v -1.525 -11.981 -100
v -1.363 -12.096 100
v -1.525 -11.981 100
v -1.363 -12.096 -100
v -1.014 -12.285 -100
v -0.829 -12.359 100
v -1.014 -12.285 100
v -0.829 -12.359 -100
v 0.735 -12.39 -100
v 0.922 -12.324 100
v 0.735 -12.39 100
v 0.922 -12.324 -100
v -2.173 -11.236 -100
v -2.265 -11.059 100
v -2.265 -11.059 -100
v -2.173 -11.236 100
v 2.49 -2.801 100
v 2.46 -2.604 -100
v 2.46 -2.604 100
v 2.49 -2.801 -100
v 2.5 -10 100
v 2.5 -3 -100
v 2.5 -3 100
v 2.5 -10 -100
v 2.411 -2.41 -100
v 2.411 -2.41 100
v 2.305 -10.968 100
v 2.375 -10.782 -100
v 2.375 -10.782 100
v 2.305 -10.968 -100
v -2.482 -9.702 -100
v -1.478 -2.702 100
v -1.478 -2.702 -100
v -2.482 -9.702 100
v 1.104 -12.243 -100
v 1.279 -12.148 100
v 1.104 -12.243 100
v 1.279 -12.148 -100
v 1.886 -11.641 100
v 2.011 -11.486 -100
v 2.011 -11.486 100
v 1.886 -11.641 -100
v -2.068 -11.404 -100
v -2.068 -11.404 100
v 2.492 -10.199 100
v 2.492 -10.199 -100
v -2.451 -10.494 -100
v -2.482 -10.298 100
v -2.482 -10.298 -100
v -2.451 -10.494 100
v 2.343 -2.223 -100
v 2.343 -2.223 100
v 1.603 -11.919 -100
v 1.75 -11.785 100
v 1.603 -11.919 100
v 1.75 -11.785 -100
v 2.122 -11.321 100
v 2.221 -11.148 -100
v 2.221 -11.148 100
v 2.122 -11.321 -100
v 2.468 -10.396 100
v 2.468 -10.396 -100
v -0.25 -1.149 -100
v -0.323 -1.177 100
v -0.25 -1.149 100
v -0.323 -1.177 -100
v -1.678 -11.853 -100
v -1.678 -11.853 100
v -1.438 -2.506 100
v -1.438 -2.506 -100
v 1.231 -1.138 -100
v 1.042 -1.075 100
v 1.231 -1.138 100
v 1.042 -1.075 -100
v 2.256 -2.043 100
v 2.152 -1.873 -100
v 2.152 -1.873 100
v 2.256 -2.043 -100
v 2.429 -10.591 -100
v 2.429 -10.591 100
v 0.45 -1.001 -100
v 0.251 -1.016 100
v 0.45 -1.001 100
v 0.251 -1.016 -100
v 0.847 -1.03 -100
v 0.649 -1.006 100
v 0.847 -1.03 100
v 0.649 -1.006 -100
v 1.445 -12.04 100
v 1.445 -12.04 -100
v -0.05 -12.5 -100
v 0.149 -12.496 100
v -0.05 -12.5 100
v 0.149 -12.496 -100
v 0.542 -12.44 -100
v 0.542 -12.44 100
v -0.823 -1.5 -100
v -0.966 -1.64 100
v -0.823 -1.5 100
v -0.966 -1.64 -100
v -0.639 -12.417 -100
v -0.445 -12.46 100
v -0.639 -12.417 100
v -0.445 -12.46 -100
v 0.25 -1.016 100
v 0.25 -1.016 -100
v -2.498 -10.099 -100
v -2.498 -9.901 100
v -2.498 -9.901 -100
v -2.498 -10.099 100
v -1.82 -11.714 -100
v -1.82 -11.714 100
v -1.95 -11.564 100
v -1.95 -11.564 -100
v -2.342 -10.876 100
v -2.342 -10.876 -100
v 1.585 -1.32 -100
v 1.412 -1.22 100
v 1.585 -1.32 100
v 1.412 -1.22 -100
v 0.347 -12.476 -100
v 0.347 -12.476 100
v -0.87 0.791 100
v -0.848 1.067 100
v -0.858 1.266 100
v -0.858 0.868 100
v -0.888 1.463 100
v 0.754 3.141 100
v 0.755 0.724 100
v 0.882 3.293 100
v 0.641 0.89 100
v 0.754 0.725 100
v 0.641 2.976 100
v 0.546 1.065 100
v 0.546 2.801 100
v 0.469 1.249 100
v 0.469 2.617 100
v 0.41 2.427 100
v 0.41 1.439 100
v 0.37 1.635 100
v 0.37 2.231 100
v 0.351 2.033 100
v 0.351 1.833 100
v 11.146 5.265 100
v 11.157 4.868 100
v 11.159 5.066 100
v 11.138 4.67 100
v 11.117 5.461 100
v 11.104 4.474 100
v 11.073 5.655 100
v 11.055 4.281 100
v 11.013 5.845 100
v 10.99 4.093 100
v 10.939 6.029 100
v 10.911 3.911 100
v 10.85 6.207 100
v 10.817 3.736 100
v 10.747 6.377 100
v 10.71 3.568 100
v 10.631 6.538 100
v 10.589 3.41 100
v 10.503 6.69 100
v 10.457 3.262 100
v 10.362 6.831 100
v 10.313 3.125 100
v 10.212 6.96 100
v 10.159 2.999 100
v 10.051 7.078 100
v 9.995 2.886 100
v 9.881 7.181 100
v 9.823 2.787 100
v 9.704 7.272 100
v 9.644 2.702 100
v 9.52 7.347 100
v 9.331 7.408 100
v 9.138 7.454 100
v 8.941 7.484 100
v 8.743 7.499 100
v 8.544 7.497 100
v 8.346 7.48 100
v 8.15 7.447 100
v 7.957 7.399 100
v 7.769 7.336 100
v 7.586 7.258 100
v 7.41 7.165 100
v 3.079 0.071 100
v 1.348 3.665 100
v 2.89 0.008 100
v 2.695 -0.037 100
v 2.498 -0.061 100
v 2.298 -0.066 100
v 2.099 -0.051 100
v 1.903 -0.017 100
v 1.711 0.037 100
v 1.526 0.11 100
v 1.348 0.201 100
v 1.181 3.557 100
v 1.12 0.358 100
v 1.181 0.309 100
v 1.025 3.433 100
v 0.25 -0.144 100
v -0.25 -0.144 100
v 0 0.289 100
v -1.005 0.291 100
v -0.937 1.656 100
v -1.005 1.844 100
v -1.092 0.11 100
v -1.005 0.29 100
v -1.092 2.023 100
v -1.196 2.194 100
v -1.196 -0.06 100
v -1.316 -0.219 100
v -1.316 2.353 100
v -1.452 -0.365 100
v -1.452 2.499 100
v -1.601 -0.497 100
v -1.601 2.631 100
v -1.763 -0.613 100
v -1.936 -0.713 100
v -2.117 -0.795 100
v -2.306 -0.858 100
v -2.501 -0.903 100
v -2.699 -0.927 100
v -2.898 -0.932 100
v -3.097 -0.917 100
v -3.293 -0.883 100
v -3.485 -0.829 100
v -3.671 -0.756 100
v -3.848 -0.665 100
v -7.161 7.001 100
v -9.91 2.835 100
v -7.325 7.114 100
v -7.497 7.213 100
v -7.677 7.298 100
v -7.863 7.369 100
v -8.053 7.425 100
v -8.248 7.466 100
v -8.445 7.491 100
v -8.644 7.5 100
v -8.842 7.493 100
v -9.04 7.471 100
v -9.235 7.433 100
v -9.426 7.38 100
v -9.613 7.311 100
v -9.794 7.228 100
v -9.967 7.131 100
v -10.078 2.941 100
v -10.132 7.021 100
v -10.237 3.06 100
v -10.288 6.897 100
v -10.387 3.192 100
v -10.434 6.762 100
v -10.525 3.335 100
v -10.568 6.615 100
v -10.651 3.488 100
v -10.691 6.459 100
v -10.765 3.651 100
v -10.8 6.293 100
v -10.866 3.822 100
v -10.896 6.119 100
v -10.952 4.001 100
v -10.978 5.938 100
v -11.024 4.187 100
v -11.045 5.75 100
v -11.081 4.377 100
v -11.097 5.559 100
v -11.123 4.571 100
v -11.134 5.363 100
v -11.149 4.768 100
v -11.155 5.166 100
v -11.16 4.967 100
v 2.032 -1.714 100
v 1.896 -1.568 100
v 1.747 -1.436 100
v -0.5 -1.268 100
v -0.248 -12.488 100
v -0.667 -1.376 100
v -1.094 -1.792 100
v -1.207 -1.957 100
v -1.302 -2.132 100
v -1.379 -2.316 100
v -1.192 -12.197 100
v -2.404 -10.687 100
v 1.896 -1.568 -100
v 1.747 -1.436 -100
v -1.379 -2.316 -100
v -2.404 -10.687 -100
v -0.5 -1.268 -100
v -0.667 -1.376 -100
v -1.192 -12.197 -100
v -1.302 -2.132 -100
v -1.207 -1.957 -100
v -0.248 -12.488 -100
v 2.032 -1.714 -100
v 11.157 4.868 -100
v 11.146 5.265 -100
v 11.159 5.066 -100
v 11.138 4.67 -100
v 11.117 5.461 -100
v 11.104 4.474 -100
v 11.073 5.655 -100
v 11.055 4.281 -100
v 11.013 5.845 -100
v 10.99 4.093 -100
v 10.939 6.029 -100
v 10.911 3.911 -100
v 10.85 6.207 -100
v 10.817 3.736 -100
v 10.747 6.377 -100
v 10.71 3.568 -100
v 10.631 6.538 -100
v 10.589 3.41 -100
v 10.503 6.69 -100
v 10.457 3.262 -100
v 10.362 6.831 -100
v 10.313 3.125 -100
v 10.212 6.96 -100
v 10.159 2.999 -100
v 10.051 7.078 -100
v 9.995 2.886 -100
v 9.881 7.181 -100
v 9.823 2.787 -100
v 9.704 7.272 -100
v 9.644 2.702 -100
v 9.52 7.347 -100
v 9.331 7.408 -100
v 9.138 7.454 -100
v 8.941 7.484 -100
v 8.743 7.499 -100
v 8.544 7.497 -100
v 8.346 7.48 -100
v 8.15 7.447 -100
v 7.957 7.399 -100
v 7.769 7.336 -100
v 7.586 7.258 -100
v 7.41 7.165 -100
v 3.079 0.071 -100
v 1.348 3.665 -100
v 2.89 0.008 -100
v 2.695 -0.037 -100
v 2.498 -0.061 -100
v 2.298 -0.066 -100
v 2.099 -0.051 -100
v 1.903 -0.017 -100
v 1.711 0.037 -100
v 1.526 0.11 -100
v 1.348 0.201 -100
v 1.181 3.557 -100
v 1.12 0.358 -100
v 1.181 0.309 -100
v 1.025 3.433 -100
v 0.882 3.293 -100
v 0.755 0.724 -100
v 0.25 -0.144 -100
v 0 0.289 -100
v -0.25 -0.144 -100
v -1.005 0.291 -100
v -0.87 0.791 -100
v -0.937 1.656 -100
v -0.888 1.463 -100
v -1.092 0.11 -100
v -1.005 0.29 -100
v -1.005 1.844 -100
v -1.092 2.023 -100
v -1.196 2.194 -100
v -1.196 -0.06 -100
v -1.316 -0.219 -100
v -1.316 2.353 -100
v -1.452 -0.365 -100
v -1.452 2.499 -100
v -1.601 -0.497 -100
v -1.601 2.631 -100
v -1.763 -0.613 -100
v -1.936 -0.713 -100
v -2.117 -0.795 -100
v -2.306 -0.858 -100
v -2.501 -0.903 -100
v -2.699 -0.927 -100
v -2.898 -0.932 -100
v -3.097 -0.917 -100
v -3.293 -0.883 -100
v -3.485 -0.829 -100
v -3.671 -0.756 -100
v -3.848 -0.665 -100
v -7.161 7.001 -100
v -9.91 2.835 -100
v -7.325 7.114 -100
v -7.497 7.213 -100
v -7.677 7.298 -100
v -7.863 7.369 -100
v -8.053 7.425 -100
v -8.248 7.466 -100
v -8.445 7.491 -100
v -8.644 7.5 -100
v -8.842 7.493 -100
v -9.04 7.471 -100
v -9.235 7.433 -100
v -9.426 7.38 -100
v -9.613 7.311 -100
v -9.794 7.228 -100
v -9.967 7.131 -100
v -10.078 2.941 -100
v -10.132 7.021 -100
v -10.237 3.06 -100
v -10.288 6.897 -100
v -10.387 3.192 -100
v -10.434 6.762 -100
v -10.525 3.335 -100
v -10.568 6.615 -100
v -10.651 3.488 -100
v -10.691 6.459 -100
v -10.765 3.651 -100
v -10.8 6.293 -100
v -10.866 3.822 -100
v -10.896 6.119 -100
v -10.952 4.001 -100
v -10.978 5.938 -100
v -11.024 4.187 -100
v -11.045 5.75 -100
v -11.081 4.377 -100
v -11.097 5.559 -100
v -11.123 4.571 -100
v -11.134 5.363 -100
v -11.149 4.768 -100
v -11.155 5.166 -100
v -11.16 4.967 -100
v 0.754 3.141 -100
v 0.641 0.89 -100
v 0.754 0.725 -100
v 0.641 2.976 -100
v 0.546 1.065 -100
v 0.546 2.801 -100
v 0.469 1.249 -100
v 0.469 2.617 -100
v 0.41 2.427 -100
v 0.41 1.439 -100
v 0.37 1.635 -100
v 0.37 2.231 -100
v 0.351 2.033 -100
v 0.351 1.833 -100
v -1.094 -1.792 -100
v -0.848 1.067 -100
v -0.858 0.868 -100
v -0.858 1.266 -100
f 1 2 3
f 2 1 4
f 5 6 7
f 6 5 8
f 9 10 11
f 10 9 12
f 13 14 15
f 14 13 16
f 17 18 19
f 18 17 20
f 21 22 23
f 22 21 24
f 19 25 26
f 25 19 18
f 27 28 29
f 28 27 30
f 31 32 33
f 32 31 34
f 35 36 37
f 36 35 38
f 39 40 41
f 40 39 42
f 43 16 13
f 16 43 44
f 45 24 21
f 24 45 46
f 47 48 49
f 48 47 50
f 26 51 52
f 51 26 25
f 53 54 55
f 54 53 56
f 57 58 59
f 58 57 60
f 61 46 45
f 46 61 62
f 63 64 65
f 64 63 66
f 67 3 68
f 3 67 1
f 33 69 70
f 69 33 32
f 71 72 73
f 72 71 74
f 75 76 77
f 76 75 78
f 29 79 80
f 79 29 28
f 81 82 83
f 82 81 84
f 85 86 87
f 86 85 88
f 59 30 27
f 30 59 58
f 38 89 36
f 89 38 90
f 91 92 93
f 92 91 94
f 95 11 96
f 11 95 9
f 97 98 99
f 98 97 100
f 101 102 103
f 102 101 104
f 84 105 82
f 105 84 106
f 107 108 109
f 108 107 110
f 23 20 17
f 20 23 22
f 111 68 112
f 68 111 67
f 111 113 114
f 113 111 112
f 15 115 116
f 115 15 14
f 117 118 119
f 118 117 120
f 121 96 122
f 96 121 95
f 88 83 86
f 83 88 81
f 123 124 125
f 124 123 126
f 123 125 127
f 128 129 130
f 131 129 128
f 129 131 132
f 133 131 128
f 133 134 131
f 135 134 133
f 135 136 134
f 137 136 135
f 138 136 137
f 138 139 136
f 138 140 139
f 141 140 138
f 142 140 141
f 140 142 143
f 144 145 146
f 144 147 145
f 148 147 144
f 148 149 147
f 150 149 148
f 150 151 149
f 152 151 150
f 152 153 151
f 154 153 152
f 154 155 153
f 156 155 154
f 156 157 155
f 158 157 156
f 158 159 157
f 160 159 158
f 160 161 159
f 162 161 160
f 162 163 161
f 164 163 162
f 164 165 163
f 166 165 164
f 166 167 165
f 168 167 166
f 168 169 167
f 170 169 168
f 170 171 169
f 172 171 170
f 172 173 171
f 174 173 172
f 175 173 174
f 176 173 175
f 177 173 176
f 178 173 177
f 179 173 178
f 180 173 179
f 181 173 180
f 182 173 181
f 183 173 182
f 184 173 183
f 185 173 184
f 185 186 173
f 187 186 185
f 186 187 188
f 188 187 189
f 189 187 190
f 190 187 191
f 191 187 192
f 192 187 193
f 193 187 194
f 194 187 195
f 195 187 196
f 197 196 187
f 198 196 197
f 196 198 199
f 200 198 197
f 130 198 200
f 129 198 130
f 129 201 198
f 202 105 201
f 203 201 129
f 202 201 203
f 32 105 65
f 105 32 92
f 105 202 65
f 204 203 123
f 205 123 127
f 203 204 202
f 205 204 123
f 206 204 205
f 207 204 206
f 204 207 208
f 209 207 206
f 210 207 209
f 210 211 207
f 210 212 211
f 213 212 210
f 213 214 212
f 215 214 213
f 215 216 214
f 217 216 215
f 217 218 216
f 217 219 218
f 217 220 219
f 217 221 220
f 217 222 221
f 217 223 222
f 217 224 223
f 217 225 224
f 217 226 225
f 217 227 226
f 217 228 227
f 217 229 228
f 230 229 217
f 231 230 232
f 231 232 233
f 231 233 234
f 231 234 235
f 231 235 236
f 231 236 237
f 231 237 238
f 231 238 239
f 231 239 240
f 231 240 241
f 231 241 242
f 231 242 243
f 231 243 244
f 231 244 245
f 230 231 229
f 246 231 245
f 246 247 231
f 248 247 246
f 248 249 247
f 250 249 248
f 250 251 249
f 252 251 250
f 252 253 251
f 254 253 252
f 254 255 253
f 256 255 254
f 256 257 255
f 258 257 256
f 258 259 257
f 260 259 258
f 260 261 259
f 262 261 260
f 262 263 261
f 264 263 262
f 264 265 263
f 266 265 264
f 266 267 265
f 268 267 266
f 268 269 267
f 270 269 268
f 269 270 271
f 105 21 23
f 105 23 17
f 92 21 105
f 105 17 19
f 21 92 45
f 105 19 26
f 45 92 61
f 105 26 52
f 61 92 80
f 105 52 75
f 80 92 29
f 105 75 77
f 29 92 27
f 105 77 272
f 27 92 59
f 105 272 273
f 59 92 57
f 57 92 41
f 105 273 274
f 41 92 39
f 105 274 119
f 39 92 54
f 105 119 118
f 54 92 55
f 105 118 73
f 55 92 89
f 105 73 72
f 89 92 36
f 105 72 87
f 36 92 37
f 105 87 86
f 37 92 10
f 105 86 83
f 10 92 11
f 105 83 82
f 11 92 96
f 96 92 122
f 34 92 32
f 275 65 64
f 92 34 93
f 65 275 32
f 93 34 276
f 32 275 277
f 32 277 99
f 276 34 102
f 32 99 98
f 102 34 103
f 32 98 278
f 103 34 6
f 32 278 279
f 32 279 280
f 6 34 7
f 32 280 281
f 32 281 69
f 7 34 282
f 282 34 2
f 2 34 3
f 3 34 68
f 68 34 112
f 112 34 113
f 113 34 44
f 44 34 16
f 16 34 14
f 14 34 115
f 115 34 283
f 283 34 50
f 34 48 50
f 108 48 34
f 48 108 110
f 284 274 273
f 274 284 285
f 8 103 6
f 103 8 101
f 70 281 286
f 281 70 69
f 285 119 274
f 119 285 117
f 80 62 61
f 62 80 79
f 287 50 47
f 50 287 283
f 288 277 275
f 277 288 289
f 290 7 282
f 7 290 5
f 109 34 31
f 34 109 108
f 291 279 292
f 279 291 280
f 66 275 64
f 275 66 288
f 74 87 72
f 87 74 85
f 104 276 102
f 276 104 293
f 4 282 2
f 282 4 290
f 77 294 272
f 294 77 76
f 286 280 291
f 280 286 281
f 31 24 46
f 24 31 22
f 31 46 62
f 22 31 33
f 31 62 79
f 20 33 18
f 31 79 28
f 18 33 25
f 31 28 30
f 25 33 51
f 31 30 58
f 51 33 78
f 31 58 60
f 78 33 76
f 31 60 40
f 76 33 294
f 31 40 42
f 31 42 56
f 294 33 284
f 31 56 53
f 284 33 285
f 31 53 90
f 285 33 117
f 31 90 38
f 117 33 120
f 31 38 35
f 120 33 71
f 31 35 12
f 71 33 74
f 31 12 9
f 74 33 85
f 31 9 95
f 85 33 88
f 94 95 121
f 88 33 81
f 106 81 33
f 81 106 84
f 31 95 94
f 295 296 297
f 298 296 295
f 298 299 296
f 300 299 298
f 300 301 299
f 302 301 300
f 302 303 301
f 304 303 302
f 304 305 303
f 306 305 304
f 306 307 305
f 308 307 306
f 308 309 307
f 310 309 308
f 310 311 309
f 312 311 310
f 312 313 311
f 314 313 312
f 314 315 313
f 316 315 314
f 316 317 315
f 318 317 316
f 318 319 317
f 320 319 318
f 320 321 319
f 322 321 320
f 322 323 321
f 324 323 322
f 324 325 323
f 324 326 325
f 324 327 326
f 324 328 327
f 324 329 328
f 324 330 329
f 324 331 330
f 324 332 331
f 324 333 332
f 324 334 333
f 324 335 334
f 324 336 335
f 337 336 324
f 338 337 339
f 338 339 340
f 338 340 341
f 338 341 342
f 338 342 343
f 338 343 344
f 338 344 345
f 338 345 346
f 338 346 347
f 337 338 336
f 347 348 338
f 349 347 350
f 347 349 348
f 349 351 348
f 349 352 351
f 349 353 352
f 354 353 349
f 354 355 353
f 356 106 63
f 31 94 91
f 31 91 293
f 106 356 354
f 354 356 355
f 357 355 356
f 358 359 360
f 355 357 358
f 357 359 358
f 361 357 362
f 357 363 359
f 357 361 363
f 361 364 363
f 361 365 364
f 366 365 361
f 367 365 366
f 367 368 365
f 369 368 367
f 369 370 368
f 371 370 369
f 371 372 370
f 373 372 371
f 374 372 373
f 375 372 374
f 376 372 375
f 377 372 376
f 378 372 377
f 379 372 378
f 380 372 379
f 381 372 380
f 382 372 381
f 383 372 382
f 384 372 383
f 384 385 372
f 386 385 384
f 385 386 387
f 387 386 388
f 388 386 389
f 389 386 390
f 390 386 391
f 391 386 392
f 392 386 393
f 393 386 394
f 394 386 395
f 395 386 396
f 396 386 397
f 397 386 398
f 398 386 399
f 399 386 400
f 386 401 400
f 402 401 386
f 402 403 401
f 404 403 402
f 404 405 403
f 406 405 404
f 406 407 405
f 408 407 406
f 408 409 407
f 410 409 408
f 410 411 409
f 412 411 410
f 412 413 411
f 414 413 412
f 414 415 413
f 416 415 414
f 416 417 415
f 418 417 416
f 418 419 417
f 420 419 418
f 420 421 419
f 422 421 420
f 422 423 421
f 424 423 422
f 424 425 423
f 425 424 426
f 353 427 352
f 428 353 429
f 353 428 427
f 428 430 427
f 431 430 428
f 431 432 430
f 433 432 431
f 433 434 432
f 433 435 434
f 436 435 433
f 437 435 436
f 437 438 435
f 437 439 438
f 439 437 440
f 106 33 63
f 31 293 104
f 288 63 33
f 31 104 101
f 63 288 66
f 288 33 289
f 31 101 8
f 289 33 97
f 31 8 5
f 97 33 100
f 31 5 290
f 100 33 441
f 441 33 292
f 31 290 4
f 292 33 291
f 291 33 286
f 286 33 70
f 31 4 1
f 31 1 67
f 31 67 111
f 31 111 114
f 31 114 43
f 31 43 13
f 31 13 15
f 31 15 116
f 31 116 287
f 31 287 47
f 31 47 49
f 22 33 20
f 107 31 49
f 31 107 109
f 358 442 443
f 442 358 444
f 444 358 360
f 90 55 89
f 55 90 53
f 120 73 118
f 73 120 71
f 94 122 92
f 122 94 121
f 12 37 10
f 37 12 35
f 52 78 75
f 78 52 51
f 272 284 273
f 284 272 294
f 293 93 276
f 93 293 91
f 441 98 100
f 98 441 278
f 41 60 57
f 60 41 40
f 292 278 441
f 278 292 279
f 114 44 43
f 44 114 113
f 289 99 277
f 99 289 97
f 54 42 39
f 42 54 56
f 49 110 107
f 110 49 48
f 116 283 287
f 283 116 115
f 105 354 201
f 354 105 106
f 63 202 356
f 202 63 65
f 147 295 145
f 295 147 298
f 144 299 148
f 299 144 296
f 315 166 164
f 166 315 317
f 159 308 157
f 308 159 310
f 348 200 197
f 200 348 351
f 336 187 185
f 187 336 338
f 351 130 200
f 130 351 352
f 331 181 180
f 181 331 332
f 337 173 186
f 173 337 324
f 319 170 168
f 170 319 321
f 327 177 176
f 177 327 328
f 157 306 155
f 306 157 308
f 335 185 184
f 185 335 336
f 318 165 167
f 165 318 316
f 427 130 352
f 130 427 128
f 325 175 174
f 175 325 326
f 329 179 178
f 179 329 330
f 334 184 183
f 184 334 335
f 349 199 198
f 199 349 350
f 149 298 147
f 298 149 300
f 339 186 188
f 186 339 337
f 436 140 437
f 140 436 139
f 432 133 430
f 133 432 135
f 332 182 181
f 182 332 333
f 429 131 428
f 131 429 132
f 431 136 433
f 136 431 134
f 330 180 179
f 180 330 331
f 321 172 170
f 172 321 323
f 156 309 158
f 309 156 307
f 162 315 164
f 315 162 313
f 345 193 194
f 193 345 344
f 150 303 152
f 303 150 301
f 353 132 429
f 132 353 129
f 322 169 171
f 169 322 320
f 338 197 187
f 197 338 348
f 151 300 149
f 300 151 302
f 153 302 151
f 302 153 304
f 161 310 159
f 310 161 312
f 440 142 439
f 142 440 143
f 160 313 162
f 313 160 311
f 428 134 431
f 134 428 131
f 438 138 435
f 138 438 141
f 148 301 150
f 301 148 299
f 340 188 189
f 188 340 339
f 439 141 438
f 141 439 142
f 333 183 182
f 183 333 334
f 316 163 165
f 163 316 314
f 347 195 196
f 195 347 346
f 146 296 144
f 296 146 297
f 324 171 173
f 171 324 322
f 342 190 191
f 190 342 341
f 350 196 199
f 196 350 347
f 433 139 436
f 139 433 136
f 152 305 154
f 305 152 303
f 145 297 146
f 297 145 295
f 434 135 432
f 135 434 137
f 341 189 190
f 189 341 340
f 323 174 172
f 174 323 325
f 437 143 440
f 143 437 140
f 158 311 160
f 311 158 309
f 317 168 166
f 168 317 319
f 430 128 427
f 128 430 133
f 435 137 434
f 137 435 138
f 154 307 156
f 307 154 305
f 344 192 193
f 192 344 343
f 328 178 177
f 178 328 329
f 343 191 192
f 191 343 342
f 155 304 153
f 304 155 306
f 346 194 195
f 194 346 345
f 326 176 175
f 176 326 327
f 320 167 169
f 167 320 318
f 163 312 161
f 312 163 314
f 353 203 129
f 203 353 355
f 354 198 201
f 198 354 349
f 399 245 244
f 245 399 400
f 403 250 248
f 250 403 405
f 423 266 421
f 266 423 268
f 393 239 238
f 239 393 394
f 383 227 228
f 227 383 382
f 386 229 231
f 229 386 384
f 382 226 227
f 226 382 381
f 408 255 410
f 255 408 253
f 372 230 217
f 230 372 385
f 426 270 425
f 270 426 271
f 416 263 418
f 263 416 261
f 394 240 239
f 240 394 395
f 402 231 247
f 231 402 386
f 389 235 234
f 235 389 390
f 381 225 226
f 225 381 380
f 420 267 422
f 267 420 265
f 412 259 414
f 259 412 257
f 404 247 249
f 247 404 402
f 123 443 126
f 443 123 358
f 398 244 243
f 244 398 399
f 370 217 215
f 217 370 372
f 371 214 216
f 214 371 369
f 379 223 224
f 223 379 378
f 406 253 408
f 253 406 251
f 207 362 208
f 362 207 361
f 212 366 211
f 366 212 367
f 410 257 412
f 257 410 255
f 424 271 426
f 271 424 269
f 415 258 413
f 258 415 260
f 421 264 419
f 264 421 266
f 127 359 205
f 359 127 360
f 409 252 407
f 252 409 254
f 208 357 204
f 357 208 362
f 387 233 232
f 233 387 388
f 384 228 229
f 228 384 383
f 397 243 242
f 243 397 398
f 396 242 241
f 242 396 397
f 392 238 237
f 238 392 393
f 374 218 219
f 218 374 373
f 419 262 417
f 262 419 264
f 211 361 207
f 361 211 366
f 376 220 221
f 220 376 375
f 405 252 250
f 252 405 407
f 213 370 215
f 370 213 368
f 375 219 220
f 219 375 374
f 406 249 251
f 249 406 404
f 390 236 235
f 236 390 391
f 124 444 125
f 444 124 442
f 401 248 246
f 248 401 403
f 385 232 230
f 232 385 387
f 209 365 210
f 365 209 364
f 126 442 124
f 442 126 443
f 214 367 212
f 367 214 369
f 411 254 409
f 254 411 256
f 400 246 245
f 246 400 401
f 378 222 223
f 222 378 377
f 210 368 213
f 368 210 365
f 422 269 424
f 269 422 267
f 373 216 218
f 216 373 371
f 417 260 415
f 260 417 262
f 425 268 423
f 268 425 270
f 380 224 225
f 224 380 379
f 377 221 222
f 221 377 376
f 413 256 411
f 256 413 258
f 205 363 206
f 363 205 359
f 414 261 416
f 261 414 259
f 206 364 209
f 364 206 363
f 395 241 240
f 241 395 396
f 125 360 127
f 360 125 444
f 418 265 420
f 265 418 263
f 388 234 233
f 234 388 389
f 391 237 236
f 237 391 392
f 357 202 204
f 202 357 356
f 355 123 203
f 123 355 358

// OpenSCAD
$fa=3;
$fs=0.2;

module chock() {
    length = 200;
    module bulk() {
        hull() {
            cylinder(r=2.5, h=length, center=true);
            translate([0.5,7,0]) cylinder(r=2, h=length, center=true);
        }
    }
    bulk();
    translate([0,5,0]) cube([0.5,10,length],true);
}

rotate([0,0,0]) translate([0,-10,0]) chock();
rotate([0,0,120]) translate([0,-10,0]) chock();
rotate([0,0,240]) translate([0,-10,0]) chock();
